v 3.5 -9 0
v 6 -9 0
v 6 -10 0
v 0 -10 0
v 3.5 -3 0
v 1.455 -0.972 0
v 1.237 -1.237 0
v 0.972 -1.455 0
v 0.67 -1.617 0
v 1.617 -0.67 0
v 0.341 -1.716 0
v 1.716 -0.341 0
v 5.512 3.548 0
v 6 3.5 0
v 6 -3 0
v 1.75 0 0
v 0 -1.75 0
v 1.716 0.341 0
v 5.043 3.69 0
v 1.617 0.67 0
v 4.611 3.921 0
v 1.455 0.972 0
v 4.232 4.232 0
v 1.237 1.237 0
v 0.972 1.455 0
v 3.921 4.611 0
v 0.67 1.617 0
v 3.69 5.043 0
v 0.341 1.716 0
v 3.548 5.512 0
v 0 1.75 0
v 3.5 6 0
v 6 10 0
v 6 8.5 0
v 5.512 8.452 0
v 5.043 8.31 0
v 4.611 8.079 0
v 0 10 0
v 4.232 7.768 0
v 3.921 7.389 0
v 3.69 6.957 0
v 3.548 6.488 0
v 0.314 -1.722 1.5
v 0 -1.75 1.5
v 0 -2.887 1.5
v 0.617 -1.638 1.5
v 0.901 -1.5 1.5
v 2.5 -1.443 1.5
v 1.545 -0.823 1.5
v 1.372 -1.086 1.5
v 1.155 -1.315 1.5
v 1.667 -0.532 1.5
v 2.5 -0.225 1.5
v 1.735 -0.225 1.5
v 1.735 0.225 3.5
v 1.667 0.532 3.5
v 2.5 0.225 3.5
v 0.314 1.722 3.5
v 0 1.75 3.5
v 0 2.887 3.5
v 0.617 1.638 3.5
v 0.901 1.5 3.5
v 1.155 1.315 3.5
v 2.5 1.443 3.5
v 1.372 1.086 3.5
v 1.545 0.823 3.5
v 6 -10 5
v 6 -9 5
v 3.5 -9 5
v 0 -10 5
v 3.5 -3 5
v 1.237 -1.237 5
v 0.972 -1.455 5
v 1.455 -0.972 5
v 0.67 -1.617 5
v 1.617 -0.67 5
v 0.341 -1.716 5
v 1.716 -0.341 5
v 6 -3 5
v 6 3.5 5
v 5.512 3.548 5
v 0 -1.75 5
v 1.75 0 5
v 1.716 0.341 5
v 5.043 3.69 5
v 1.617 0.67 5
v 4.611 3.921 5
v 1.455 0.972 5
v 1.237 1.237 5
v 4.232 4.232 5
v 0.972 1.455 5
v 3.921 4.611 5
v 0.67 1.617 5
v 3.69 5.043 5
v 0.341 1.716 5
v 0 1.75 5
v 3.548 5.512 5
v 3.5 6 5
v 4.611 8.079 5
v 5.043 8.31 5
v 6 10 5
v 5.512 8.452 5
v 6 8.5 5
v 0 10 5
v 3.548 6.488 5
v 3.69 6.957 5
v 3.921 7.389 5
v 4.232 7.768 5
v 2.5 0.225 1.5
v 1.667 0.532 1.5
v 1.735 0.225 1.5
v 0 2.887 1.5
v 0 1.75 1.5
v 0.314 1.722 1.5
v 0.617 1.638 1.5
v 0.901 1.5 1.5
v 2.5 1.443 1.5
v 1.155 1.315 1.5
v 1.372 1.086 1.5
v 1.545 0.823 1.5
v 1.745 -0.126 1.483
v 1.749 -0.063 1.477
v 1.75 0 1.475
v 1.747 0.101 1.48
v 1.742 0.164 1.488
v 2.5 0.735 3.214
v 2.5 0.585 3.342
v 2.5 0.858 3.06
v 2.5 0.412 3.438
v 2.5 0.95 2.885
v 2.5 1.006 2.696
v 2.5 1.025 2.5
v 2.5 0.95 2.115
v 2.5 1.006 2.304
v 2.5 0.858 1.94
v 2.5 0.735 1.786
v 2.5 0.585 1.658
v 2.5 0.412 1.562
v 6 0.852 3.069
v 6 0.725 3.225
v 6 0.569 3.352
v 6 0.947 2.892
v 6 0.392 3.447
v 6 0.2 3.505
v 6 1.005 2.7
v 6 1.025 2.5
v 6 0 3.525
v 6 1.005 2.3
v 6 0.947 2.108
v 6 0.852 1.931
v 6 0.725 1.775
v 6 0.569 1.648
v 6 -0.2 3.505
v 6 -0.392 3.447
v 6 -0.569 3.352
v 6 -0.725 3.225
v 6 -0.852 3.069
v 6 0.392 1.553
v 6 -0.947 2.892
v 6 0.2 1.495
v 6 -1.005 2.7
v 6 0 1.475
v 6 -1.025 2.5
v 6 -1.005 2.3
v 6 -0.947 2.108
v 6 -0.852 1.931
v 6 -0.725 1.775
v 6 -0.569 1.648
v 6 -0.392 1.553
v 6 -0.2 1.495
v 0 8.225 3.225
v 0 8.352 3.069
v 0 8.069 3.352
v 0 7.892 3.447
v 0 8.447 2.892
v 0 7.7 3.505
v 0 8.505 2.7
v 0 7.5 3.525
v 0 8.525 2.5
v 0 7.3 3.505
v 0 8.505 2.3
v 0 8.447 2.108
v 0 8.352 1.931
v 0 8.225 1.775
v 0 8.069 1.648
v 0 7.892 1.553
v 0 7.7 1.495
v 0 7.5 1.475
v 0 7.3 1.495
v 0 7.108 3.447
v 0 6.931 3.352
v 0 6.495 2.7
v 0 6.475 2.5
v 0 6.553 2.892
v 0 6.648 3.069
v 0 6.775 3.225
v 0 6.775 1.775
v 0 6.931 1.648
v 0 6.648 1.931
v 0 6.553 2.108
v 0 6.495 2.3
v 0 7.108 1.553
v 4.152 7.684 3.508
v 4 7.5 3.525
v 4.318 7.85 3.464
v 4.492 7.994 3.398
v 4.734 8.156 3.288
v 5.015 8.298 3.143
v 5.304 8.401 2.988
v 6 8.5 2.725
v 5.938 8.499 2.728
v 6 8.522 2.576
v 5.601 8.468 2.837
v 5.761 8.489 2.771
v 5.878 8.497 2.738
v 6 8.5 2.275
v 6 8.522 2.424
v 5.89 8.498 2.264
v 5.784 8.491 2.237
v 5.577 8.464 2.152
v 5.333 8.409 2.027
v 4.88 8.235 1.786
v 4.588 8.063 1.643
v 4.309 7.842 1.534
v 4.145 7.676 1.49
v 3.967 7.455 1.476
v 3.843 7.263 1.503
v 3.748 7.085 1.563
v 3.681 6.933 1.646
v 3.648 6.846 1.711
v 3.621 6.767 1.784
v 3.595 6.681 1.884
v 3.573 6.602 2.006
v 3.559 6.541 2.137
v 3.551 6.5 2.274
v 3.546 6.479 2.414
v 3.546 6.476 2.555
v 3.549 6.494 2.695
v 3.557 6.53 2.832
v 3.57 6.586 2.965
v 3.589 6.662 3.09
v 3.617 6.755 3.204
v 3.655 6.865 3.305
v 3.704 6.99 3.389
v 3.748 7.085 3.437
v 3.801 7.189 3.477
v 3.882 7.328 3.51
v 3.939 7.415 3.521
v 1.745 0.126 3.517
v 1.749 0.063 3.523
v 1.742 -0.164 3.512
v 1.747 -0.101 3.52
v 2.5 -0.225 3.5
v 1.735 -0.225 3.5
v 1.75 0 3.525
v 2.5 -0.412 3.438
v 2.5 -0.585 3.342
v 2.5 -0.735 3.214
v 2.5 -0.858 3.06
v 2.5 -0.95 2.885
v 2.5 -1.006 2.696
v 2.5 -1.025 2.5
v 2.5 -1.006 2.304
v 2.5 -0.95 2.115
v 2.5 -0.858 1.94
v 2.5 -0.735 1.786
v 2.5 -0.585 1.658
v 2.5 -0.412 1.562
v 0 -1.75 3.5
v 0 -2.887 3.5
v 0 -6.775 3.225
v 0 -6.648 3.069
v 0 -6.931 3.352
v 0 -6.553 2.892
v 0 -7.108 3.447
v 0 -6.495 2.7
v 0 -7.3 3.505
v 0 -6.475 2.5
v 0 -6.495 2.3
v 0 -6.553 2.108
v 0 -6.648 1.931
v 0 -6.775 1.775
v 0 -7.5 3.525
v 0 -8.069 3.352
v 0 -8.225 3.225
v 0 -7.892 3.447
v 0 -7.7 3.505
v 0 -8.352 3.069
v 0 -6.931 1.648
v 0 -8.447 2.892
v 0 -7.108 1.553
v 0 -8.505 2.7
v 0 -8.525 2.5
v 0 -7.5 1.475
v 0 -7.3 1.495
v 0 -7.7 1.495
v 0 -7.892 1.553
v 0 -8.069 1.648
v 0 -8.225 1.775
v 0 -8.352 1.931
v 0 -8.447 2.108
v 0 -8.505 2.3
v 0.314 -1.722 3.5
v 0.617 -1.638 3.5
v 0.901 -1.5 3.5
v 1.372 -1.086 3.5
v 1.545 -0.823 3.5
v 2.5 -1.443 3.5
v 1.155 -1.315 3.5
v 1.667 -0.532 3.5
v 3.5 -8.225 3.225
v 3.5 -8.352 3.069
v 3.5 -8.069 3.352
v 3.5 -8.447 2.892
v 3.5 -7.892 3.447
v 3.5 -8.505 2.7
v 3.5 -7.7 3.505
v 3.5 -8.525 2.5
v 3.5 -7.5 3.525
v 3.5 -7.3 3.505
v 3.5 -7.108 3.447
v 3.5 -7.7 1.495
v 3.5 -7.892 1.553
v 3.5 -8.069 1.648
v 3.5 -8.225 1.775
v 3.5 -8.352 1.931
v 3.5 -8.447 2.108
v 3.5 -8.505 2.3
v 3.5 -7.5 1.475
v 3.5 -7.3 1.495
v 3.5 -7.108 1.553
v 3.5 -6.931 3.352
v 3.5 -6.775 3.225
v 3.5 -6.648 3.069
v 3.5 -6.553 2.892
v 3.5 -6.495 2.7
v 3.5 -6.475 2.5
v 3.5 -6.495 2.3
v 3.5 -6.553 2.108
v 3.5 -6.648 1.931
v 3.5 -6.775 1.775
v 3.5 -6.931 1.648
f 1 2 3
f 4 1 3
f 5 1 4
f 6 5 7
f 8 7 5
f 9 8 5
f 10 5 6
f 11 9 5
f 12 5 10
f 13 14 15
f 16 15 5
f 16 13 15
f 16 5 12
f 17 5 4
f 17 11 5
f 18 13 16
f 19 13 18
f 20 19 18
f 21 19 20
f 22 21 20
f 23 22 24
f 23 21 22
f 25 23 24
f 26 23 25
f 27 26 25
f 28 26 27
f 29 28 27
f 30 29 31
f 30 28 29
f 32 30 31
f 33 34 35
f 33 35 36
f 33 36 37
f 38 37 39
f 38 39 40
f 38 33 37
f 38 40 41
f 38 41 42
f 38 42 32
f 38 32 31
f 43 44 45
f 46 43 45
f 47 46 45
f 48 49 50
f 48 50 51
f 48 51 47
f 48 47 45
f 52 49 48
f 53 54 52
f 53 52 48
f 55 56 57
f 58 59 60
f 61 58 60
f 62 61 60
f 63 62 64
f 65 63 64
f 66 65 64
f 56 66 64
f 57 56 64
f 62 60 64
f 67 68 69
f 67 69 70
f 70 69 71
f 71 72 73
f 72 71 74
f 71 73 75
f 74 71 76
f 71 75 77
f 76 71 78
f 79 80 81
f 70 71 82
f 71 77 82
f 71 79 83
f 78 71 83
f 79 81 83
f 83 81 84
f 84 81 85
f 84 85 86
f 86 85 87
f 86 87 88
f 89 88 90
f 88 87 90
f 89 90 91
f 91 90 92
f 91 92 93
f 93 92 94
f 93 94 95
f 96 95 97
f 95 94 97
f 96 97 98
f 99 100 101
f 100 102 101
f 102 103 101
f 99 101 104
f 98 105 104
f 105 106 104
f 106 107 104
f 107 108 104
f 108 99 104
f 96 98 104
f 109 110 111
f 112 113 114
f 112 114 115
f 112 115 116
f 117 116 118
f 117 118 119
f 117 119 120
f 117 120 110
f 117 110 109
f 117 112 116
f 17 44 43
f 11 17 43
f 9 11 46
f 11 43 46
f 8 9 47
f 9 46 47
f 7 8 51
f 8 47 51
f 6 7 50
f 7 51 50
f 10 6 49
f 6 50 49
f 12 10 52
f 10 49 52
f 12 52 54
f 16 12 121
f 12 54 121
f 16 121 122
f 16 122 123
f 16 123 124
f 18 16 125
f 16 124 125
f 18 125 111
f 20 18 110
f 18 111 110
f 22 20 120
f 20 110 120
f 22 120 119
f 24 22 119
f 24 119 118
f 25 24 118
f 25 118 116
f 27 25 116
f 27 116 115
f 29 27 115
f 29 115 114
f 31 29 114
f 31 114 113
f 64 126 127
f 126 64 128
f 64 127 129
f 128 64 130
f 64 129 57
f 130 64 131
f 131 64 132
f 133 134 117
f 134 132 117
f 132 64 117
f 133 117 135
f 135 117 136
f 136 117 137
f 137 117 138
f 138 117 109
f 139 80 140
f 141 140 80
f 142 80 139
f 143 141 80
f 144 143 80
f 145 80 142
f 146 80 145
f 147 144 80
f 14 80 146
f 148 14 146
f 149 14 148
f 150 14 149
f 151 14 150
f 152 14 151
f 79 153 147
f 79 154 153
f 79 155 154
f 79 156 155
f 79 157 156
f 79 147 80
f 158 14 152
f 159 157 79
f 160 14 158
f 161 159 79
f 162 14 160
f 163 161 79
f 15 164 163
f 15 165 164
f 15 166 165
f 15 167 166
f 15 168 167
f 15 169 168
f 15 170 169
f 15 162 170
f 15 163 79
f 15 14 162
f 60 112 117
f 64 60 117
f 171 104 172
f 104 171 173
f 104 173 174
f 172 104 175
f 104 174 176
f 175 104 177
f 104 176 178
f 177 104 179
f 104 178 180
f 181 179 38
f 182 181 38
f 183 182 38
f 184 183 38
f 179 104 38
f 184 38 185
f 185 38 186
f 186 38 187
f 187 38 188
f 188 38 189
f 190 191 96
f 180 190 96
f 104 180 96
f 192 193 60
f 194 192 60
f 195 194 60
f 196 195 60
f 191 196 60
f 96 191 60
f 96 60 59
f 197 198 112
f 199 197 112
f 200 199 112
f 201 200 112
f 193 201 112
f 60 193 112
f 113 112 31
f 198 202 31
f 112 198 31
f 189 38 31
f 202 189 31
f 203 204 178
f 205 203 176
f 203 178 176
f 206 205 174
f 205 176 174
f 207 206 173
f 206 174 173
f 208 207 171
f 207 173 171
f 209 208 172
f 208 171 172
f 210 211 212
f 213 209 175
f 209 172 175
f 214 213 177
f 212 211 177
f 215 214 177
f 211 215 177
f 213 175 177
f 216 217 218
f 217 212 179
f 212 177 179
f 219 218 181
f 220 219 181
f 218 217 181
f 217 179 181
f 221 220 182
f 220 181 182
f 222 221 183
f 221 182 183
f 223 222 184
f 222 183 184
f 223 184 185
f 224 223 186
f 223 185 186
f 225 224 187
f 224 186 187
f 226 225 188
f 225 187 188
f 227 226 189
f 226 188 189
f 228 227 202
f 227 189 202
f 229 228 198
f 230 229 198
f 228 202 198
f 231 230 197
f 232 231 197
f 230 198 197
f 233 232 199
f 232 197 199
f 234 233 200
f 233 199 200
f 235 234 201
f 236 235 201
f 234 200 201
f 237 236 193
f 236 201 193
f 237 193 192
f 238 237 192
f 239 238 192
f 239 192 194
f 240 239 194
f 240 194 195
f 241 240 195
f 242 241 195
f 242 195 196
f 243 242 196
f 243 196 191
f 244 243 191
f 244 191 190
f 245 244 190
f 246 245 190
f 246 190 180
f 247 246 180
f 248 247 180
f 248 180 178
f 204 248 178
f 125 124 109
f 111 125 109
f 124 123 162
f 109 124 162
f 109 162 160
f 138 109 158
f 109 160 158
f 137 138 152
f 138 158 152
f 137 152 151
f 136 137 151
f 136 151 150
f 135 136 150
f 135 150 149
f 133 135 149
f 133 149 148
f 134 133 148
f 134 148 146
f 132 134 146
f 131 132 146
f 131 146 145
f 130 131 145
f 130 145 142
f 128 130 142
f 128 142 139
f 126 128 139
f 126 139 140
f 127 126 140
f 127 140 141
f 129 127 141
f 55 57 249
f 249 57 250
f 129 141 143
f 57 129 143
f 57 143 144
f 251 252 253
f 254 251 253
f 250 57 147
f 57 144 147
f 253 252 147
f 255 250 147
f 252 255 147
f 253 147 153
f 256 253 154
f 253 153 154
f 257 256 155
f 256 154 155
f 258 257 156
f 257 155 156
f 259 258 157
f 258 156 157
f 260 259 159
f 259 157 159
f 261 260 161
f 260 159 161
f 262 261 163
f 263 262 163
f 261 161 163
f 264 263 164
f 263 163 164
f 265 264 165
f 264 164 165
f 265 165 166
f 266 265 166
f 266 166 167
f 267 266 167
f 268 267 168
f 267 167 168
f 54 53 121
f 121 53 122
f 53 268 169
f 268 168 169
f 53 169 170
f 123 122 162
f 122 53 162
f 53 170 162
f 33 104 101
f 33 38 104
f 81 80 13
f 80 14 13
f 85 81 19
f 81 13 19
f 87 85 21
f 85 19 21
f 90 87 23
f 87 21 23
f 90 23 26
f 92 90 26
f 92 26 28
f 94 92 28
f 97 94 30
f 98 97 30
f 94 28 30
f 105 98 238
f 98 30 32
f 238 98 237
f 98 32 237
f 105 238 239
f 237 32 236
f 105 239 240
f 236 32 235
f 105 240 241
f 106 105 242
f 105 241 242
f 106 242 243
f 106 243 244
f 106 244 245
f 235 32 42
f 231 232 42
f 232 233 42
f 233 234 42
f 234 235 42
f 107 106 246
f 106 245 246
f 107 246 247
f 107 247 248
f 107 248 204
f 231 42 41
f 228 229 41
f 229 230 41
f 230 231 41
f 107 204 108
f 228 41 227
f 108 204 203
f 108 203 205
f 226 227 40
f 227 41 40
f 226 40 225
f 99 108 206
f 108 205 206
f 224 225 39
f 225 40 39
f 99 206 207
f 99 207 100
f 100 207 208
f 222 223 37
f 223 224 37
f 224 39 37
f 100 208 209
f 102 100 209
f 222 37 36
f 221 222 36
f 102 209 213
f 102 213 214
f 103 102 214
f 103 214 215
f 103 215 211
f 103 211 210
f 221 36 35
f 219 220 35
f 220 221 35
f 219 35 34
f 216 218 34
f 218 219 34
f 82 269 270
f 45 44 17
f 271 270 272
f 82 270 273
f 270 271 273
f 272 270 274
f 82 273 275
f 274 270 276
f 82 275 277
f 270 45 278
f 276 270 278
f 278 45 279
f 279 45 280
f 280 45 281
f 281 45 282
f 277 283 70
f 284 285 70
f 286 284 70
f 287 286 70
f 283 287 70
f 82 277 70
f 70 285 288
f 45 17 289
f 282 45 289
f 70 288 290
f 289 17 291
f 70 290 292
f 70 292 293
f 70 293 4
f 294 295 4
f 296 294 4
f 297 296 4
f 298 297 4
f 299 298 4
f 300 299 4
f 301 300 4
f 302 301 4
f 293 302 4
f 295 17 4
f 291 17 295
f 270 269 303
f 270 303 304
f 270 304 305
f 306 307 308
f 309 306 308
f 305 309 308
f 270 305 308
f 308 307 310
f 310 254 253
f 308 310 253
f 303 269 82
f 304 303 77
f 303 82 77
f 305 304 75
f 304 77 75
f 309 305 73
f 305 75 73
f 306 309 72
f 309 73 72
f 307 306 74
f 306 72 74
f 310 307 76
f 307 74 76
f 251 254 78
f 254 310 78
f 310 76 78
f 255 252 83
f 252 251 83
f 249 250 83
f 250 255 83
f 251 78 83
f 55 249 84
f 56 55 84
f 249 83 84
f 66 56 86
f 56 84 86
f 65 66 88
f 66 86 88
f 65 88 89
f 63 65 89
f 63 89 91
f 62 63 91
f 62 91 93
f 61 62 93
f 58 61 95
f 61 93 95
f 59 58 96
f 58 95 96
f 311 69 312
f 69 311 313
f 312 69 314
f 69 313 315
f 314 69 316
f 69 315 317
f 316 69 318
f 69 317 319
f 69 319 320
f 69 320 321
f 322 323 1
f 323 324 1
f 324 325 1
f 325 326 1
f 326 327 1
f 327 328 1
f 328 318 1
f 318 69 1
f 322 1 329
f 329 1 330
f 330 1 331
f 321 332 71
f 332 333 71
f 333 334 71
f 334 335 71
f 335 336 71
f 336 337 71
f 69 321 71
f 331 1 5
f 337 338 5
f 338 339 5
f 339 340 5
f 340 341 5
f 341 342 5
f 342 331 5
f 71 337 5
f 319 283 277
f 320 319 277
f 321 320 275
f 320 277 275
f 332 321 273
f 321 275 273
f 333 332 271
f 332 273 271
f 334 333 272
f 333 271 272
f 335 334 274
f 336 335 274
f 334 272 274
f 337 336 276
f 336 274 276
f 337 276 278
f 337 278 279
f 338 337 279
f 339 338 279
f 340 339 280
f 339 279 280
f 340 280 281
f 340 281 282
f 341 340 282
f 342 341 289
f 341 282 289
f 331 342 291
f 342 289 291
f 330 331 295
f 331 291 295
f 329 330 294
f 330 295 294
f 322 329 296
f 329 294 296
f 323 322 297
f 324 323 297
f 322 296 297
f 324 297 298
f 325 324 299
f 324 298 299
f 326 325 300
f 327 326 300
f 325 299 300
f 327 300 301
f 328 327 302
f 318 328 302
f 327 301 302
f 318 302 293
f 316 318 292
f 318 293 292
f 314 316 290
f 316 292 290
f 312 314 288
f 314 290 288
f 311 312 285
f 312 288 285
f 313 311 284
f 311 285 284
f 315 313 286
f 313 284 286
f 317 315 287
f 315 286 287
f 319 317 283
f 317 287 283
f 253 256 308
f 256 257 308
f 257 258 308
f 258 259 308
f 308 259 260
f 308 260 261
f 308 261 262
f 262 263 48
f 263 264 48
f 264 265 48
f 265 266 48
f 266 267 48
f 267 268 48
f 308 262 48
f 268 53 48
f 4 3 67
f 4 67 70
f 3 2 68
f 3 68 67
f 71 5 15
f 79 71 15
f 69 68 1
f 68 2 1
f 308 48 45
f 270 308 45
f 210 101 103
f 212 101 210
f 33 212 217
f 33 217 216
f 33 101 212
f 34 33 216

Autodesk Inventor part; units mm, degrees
ref_plane "YZ Plane" through (0, 0, 0) normal (1, 0, 0) x (0, 1, 0)
ref_plane "XZ Plane" through (0, 0, 0) normal (0, 1, 0) x (-1, 0, 0)
sketch "Sketch1" plane through (0, 0, 0) normal (0, 0, 1) x (1, 0, 0)
  line L0 (10, -10) -> (-10, -10)
  line L1 (-10, -10) -> (-10, 10)
  line L2 (-10, 10) -> (10, 10)
  line L3 (10, 10) -> (10, -10)
  line L4 (10, -10) -> (-10, 10) construction
  line L5 (-10, -10) -> (10, 10) construction
  line L6 (10, -10) -> (6, -10)
  line L7 (6, -10) -> (6, 10)
  line L8 (6, 10) -> (10, 10)
  line L9 (10, 10) -> (10, -10)
  line L10 (6, 2) -> (4, 2)
  line L11 (4, 2) -> (4, -2)
  line L12 (4, -2) -> (6, -2)
  line L13 (6, -2) -> (6, 2)
  line L14 (0, 10) -> (0, -10)
  point P0 (0, 0)
  dimension "d0" = 20
  dimension "d1" = 20
  dimension "d2" = 4
  dimension "d6" = 2
  dimension "d7" = 2
  dimension "d8" = 4
  dimension "d9" = 2
  dimension "d44" = 6
extrude "Extrusion1" add sketch "Sketch1" along normal blind 5 contours L0 L14 L2 L7 L10 L11 L12
ref_plane "Work Plane1" through (0, 0, 2.5) normal (0, 0, 1) x (1, 0, 0)
sketch "Sketch2" plane through (0, 0, 2.5) normal (0, 0, 1) x (1, 0, 0)
  line L0 (0, 10) -> (0, -10) projected
  line L1 (0, 2.8868) -> (2.5, 1.4434)
  line L2 (2.5, 1.4434) -> (2.5, -1.4434)
  line L3 (2.5, -1.4434) -> (0, -2.8868)
  line L4 (0, -2.8868) -> (-2.5, -1.4434)
  line L5 (-2.5, -1.4434) -> (-2.5, 1.4434)
  line L6 (-2.5, 1.4434) -> (0, 2.8868)
  point P0 (0, 0)
  point P1 (0, 0)
  dimension "d12" = 5
extrude "Extrusion2" cut sketch "Sketch2" along normal mid plane 2
sketch "Sketch3" plane through (0, 0, 5) normal (0, 0, 1) x (1, 0, 0)
  circle A0 centre (0, 0) radius 1.75
  dimension "d15" = 3.5
extrude "Extrusion3" cut sketch "Sketch3" against normal blind 8
sketch "Sketch4" plane through (0, 10, 0) normal (-1, 0, 0) x (0, 0, 1)
  circle A0 centre (2.5, -2.5) radius 1.025
  circle A1 centre (2.5, -17.5) radius 1.025
  line L0 (0, 0) -> (5, 0) projected
  line L1 (0, 0) -> (0, -8.25) projected
  line L2 (0, -11.75) -> (0, -20) projected
  line L3 (0, -20) -> (5, -20) projected
  point P0 (0, -10)
  dimension "d18" = 2.05
  dimension "d19" = 2.05
  dimension "d20" = 2.5
  dimension "d21" = 2.5
  dimension "d22" = 2.5
  dimension "d23" = 2.5
extrude "Extrusion4" cut sketch "Sketch4" against normal blind 25
sketch "Sketch5" plane through (0, 0, 0) normal (0, 0, -1) x (-1, 0, 0)
  line L0 (-4, -2) -> (-4, 2) projected
  line L1 (-6, -10) -> (-6, -2) projected
  line L2 (-4, 2) -> (-6, 2)
  line L3 (-6, 2) -> (-6, -2)
  line L4 (-6, -2) -> (-4, -2)
  line L5 (-4, -2) -> (-4, 2)
  point P0 (0, 0)
extrude "Extrusion5" add sketch "Sketch5" against normal blind 5
sketch "Sketch6" plane through (0, 0, 0) normal (0, 0, -1) x (-1, 0, 0)
  line L0 (-6, -10) -> (-6, 10) projected
  circle A0 centre (-6, 6) radius 2.5
  line L1 (-6, -9) -> (-3.5, -9)
  line L2 (-3.5, -9) -> (-3.5, -3)
  line L3 (-3.5, -3) -> (-6, -3)
  line L4 (-6, -3) -> (-6, -9)
  line L5 (0, -10) -> (-6, -10) projected
  line L6 (-6, 10) -> (0, 10) projected
  point P0 (0, 0)
  point P1 (-6, 8.5)
  point P2 (-6, 3.5)
  dimension "d32" = 2.5
  dimension "d33" = 1
  dimension "d34" = 6
  dimension "d35" = 5
  dimension "d36" = 4
extrude "Extrusion6" cut sketch "Sketch6" against normal blind 5 contours L0 A0 | L0 L3 L2 L1 picked at (-5.3485, 6.5196)
sketch "Sketch7" plane through (6, -3, 0) normal (1, 0, 0) x (0, 0, -1)
  circle A0 centre (-2.5, 3) radius 1.025
  line L0 (-5, 0) -> (-5, 6.5) projected
  line L1 (0, -7) -> (-5, -7) projected
  point P0 (0, 3)
  dimension "d39" = 2.5
  dimension "d40" = 10
  dimension "d41" = 2.05
extrude "Extrusion7" cut sketch "Sketch7" against normal blind 12
equation "\"d18\" = d19"
properties part number "POMSliderMotor" material "Acetal Resin, White"
